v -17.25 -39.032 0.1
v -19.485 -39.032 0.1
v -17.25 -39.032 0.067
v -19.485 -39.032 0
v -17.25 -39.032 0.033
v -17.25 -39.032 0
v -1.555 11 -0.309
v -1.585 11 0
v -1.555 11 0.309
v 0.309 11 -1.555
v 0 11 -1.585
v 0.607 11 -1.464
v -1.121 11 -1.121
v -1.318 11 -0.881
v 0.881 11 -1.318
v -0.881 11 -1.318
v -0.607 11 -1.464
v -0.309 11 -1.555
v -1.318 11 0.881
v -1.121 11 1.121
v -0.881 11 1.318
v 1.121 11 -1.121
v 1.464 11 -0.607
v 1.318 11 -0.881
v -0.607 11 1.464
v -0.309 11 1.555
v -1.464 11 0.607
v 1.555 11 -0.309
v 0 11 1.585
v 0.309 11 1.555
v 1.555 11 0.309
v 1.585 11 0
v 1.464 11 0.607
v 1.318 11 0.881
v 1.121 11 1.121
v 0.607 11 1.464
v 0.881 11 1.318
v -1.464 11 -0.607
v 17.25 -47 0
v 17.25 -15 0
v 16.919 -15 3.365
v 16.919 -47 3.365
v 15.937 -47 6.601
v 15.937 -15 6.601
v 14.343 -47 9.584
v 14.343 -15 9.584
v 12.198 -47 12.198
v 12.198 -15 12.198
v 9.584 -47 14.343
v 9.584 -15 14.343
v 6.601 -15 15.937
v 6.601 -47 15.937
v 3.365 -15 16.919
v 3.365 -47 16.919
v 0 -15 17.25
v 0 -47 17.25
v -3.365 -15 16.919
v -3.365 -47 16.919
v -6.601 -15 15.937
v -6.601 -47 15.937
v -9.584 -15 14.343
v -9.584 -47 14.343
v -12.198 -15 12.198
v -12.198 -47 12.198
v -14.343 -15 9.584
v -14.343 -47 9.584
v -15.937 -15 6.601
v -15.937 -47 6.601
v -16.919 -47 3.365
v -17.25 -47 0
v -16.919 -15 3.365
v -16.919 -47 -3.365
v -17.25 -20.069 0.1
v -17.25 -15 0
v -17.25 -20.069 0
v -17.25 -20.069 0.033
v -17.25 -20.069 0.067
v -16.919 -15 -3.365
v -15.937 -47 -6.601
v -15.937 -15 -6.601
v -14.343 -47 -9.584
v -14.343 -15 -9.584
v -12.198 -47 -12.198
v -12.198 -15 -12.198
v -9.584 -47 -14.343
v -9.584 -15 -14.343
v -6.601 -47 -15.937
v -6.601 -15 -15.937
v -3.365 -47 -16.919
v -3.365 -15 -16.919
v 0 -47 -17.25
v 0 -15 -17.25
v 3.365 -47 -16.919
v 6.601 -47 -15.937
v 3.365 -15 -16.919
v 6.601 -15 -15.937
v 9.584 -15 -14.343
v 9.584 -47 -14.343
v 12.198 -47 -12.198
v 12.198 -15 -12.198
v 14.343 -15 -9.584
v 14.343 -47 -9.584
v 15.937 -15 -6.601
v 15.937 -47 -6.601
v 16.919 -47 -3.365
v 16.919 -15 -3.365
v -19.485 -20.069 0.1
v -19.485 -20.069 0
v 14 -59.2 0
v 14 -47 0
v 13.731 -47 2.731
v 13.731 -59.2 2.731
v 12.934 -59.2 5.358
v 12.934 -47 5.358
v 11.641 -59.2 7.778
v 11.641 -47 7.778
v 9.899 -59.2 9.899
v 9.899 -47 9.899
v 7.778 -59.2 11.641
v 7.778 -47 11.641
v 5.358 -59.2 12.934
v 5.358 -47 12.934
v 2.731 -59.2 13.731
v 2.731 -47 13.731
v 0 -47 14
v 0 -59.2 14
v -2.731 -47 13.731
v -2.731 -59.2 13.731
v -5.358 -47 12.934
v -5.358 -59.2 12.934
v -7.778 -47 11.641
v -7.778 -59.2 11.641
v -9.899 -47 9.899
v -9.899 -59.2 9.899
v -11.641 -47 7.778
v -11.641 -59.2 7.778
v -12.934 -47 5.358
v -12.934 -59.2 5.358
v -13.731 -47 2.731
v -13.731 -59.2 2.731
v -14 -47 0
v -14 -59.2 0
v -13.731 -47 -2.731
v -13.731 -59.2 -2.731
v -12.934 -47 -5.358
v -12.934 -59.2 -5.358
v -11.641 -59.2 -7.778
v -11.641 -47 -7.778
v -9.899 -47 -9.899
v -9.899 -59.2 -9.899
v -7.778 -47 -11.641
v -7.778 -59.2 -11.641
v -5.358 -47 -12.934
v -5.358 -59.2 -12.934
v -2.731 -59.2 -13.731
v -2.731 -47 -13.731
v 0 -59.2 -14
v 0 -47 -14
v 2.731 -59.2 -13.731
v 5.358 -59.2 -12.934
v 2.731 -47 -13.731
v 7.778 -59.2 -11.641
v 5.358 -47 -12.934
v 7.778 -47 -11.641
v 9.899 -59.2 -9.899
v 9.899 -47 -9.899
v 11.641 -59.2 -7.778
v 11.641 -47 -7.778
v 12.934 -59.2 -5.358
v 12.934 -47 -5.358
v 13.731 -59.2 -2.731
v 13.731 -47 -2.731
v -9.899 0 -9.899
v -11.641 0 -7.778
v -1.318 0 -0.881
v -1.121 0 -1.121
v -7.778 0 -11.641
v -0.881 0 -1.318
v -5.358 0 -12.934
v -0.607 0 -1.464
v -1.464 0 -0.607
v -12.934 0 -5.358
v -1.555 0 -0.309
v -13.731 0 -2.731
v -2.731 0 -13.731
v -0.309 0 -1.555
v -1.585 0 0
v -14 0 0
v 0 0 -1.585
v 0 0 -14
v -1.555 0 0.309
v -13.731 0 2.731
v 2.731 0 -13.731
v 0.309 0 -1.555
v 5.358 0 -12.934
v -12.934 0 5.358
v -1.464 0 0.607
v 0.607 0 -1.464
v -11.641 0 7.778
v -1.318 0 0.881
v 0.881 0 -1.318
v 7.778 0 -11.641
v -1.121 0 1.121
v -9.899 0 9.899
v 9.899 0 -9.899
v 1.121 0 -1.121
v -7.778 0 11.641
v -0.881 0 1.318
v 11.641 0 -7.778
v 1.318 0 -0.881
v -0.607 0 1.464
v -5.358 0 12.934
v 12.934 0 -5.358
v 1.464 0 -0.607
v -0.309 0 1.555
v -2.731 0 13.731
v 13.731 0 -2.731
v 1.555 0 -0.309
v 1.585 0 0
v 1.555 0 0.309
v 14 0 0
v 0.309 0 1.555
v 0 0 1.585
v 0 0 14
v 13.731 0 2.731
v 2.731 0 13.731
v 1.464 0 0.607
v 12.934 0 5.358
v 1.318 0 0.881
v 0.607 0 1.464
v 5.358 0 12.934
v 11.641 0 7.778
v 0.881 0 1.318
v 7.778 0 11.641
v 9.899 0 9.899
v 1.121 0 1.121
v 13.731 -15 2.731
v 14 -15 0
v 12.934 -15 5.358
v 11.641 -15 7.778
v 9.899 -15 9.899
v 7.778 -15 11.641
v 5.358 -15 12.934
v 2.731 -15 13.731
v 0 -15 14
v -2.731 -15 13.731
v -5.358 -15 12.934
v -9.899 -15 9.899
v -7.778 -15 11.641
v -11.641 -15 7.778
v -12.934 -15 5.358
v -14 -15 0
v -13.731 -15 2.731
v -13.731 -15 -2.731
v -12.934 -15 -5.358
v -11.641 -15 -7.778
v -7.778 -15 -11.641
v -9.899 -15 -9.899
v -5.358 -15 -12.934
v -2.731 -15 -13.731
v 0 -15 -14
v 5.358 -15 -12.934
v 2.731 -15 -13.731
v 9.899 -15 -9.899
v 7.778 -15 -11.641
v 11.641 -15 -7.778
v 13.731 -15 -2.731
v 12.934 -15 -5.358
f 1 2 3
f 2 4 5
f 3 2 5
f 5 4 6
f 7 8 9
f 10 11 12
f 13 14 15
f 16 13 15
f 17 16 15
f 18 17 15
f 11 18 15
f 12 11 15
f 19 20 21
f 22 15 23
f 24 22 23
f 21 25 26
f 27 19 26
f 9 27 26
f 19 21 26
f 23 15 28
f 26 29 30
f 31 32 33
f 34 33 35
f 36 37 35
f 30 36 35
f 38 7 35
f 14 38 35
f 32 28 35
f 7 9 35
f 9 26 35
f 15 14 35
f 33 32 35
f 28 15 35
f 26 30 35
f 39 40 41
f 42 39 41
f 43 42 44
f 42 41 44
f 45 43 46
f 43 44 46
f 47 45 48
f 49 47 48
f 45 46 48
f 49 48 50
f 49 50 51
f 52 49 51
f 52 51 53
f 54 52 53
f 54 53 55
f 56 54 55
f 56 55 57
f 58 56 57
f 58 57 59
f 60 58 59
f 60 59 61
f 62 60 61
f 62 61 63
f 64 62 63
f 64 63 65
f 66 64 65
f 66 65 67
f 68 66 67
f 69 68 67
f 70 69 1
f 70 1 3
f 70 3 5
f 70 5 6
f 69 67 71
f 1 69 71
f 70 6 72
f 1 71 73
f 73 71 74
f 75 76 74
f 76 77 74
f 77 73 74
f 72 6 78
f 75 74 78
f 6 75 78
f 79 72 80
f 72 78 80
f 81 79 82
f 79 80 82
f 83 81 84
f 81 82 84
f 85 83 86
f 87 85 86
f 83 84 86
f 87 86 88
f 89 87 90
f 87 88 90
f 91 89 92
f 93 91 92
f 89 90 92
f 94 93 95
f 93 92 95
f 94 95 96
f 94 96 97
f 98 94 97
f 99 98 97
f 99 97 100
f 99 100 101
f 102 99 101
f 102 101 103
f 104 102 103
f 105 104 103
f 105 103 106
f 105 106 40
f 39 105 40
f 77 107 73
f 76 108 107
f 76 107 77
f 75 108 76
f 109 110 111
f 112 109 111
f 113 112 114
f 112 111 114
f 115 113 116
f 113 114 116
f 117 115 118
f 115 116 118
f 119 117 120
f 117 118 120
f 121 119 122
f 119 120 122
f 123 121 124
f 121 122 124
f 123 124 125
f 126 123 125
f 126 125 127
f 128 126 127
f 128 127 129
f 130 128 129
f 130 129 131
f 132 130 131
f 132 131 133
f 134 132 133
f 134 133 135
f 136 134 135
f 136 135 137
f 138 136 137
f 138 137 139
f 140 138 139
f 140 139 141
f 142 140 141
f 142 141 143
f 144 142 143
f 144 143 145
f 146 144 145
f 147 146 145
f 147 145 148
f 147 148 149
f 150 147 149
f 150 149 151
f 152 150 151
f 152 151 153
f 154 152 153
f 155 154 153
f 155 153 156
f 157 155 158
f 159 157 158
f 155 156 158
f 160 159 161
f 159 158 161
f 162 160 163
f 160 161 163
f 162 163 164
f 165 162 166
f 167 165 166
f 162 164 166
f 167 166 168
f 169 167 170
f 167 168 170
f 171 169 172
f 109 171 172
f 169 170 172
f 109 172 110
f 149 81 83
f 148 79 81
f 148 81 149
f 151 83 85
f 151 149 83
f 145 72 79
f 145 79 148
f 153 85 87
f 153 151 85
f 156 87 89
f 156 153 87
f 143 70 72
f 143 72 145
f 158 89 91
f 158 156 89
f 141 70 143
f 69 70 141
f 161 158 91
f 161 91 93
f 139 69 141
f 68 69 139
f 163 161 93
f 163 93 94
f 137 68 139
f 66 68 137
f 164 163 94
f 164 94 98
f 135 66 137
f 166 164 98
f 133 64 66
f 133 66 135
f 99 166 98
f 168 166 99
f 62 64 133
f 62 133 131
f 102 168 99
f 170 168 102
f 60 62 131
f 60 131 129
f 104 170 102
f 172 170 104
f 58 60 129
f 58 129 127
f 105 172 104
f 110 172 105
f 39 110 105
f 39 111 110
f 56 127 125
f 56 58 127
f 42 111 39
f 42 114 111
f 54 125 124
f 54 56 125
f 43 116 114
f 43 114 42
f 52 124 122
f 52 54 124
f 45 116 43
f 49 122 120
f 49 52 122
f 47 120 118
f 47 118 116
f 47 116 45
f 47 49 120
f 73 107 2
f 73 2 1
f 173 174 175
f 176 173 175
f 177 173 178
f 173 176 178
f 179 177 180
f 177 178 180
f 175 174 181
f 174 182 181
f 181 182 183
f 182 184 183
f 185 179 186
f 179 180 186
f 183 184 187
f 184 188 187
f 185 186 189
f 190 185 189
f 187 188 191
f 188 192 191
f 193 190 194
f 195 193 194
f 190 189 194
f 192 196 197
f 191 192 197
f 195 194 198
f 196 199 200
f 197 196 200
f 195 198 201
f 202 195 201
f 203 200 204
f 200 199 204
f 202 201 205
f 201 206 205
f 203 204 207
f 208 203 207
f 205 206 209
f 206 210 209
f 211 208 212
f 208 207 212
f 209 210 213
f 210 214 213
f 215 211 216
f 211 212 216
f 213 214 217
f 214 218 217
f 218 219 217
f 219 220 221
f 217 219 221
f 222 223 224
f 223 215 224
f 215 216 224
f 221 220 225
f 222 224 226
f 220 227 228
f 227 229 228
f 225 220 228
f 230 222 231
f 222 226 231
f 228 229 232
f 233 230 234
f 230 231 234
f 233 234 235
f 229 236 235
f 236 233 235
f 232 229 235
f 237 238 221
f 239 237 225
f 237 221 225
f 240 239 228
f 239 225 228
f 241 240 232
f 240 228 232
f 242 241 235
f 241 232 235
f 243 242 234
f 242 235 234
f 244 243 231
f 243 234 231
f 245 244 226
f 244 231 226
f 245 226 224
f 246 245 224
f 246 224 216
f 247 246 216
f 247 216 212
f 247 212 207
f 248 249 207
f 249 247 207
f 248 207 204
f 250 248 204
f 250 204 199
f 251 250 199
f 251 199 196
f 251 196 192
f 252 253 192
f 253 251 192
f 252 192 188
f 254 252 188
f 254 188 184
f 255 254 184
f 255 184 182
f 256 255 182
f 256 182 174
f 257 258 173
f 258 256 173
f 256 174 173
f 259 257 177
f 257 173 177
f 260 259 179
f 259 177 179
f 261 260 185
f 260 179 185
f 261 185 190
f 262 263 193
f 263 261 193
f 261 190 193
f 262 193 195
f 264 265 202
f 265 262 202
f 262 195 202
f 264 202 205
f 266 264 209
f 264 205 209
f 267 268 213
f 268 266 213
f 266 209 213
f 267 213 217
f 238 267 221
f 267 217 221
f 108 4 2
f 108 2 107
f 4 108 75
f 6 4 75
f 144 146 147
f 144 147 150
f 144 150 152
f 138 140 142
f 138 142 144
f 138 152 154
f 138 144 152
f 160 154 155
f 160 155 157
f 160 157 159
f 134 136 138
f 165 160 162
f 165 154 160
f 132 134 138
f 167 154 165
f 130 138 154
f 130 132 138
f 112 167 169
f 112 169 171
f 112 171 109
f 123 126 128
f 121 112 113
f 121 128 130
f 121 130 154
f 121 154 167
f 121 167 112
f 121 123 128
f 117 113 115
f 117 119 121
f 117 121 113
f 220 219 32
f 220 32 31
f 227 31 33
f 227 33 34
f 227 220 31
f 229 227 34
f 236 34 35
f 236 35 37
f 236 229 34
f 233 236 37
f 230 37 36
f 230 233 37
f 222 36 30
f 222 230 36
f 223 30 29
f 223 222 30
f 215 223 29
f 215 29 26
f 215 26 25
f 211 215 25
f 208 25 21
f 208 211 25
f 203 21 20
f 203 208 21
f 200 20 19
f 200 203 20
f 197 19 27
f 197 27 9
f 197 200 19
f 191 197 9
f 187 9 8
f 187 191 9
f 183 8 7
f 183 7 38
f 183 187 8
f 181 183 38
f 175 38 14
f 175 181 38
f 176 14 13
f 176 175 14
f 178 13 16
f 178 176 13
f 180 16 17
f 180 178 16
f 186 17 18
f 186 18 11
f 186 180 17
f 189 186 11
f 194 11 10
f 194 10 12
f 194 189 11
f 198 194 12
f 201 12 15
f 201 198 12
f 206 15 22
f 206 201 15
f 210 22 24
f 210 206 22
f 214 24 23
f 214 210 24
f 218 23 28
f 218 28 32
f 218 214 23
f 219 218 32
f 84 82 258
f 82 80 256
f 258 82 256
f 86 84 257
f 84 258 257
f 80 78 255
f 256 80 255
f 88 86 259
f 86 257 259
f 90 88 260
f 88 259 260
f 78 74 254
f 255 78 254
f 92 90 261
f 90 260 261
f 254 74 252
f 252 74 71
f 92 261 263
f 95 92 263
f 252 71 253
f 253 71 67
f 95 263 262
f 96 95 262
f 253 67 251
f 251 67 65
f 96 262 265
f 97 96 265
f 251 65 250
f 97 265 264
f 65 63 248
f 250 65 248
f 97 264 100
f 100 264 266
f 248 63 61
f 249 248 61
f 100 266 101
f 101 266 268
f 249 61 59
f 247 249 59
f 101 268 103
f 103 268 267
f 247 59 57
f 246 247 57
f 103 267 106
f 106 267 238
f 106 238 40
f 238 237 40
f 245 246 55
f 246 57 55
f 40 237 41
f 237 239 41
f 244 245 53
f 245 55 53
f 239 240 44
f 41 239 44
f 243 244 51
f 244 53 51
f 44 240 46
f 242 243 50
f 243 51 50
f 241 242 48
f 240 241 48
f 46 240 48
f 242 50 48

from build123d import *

# Parameters (mm, degrees)
F0_R     = 14
F1_DEPTH = 59.2
F3_START = 15
F2_R     = 17.25
F3_DEPTH = 32
F4_R     = 1.585
F5_DEPTH = 11
F6_W     = 4.3914923444
F6_H     = 18.9632624388
F7_DEPTH = 0.1


with BuildPart() as f1:
    # F0 (on Front) → F1 (new body)
    with BuildSketch(Plane.XZ):
        Circle(F0_R)
    extrude(amount=F1_DEPTH)

    # F2 (on Front) → F3 (join)
    with BuildSketch(Plane.XZ.offset(F3_START)):
        Circle(F2_R)
    extrude(amount=F3_DEPTH)

    # F4 (on Front) → F5 (join)
    with BuildSketch(Plane.XZ):
        Circle(F4_R)
    extrude(amount=-F5_DEPTH)

    # F6 (on Top) → F7 (join)
    with BuildSketch(Plane.XY):
        with Locations((-17.2895635478, -29.550164938)):
            Rectangle(F6_W, F6_H)
    extrude(amount=F7_DEPTH)


solid = f1.part
